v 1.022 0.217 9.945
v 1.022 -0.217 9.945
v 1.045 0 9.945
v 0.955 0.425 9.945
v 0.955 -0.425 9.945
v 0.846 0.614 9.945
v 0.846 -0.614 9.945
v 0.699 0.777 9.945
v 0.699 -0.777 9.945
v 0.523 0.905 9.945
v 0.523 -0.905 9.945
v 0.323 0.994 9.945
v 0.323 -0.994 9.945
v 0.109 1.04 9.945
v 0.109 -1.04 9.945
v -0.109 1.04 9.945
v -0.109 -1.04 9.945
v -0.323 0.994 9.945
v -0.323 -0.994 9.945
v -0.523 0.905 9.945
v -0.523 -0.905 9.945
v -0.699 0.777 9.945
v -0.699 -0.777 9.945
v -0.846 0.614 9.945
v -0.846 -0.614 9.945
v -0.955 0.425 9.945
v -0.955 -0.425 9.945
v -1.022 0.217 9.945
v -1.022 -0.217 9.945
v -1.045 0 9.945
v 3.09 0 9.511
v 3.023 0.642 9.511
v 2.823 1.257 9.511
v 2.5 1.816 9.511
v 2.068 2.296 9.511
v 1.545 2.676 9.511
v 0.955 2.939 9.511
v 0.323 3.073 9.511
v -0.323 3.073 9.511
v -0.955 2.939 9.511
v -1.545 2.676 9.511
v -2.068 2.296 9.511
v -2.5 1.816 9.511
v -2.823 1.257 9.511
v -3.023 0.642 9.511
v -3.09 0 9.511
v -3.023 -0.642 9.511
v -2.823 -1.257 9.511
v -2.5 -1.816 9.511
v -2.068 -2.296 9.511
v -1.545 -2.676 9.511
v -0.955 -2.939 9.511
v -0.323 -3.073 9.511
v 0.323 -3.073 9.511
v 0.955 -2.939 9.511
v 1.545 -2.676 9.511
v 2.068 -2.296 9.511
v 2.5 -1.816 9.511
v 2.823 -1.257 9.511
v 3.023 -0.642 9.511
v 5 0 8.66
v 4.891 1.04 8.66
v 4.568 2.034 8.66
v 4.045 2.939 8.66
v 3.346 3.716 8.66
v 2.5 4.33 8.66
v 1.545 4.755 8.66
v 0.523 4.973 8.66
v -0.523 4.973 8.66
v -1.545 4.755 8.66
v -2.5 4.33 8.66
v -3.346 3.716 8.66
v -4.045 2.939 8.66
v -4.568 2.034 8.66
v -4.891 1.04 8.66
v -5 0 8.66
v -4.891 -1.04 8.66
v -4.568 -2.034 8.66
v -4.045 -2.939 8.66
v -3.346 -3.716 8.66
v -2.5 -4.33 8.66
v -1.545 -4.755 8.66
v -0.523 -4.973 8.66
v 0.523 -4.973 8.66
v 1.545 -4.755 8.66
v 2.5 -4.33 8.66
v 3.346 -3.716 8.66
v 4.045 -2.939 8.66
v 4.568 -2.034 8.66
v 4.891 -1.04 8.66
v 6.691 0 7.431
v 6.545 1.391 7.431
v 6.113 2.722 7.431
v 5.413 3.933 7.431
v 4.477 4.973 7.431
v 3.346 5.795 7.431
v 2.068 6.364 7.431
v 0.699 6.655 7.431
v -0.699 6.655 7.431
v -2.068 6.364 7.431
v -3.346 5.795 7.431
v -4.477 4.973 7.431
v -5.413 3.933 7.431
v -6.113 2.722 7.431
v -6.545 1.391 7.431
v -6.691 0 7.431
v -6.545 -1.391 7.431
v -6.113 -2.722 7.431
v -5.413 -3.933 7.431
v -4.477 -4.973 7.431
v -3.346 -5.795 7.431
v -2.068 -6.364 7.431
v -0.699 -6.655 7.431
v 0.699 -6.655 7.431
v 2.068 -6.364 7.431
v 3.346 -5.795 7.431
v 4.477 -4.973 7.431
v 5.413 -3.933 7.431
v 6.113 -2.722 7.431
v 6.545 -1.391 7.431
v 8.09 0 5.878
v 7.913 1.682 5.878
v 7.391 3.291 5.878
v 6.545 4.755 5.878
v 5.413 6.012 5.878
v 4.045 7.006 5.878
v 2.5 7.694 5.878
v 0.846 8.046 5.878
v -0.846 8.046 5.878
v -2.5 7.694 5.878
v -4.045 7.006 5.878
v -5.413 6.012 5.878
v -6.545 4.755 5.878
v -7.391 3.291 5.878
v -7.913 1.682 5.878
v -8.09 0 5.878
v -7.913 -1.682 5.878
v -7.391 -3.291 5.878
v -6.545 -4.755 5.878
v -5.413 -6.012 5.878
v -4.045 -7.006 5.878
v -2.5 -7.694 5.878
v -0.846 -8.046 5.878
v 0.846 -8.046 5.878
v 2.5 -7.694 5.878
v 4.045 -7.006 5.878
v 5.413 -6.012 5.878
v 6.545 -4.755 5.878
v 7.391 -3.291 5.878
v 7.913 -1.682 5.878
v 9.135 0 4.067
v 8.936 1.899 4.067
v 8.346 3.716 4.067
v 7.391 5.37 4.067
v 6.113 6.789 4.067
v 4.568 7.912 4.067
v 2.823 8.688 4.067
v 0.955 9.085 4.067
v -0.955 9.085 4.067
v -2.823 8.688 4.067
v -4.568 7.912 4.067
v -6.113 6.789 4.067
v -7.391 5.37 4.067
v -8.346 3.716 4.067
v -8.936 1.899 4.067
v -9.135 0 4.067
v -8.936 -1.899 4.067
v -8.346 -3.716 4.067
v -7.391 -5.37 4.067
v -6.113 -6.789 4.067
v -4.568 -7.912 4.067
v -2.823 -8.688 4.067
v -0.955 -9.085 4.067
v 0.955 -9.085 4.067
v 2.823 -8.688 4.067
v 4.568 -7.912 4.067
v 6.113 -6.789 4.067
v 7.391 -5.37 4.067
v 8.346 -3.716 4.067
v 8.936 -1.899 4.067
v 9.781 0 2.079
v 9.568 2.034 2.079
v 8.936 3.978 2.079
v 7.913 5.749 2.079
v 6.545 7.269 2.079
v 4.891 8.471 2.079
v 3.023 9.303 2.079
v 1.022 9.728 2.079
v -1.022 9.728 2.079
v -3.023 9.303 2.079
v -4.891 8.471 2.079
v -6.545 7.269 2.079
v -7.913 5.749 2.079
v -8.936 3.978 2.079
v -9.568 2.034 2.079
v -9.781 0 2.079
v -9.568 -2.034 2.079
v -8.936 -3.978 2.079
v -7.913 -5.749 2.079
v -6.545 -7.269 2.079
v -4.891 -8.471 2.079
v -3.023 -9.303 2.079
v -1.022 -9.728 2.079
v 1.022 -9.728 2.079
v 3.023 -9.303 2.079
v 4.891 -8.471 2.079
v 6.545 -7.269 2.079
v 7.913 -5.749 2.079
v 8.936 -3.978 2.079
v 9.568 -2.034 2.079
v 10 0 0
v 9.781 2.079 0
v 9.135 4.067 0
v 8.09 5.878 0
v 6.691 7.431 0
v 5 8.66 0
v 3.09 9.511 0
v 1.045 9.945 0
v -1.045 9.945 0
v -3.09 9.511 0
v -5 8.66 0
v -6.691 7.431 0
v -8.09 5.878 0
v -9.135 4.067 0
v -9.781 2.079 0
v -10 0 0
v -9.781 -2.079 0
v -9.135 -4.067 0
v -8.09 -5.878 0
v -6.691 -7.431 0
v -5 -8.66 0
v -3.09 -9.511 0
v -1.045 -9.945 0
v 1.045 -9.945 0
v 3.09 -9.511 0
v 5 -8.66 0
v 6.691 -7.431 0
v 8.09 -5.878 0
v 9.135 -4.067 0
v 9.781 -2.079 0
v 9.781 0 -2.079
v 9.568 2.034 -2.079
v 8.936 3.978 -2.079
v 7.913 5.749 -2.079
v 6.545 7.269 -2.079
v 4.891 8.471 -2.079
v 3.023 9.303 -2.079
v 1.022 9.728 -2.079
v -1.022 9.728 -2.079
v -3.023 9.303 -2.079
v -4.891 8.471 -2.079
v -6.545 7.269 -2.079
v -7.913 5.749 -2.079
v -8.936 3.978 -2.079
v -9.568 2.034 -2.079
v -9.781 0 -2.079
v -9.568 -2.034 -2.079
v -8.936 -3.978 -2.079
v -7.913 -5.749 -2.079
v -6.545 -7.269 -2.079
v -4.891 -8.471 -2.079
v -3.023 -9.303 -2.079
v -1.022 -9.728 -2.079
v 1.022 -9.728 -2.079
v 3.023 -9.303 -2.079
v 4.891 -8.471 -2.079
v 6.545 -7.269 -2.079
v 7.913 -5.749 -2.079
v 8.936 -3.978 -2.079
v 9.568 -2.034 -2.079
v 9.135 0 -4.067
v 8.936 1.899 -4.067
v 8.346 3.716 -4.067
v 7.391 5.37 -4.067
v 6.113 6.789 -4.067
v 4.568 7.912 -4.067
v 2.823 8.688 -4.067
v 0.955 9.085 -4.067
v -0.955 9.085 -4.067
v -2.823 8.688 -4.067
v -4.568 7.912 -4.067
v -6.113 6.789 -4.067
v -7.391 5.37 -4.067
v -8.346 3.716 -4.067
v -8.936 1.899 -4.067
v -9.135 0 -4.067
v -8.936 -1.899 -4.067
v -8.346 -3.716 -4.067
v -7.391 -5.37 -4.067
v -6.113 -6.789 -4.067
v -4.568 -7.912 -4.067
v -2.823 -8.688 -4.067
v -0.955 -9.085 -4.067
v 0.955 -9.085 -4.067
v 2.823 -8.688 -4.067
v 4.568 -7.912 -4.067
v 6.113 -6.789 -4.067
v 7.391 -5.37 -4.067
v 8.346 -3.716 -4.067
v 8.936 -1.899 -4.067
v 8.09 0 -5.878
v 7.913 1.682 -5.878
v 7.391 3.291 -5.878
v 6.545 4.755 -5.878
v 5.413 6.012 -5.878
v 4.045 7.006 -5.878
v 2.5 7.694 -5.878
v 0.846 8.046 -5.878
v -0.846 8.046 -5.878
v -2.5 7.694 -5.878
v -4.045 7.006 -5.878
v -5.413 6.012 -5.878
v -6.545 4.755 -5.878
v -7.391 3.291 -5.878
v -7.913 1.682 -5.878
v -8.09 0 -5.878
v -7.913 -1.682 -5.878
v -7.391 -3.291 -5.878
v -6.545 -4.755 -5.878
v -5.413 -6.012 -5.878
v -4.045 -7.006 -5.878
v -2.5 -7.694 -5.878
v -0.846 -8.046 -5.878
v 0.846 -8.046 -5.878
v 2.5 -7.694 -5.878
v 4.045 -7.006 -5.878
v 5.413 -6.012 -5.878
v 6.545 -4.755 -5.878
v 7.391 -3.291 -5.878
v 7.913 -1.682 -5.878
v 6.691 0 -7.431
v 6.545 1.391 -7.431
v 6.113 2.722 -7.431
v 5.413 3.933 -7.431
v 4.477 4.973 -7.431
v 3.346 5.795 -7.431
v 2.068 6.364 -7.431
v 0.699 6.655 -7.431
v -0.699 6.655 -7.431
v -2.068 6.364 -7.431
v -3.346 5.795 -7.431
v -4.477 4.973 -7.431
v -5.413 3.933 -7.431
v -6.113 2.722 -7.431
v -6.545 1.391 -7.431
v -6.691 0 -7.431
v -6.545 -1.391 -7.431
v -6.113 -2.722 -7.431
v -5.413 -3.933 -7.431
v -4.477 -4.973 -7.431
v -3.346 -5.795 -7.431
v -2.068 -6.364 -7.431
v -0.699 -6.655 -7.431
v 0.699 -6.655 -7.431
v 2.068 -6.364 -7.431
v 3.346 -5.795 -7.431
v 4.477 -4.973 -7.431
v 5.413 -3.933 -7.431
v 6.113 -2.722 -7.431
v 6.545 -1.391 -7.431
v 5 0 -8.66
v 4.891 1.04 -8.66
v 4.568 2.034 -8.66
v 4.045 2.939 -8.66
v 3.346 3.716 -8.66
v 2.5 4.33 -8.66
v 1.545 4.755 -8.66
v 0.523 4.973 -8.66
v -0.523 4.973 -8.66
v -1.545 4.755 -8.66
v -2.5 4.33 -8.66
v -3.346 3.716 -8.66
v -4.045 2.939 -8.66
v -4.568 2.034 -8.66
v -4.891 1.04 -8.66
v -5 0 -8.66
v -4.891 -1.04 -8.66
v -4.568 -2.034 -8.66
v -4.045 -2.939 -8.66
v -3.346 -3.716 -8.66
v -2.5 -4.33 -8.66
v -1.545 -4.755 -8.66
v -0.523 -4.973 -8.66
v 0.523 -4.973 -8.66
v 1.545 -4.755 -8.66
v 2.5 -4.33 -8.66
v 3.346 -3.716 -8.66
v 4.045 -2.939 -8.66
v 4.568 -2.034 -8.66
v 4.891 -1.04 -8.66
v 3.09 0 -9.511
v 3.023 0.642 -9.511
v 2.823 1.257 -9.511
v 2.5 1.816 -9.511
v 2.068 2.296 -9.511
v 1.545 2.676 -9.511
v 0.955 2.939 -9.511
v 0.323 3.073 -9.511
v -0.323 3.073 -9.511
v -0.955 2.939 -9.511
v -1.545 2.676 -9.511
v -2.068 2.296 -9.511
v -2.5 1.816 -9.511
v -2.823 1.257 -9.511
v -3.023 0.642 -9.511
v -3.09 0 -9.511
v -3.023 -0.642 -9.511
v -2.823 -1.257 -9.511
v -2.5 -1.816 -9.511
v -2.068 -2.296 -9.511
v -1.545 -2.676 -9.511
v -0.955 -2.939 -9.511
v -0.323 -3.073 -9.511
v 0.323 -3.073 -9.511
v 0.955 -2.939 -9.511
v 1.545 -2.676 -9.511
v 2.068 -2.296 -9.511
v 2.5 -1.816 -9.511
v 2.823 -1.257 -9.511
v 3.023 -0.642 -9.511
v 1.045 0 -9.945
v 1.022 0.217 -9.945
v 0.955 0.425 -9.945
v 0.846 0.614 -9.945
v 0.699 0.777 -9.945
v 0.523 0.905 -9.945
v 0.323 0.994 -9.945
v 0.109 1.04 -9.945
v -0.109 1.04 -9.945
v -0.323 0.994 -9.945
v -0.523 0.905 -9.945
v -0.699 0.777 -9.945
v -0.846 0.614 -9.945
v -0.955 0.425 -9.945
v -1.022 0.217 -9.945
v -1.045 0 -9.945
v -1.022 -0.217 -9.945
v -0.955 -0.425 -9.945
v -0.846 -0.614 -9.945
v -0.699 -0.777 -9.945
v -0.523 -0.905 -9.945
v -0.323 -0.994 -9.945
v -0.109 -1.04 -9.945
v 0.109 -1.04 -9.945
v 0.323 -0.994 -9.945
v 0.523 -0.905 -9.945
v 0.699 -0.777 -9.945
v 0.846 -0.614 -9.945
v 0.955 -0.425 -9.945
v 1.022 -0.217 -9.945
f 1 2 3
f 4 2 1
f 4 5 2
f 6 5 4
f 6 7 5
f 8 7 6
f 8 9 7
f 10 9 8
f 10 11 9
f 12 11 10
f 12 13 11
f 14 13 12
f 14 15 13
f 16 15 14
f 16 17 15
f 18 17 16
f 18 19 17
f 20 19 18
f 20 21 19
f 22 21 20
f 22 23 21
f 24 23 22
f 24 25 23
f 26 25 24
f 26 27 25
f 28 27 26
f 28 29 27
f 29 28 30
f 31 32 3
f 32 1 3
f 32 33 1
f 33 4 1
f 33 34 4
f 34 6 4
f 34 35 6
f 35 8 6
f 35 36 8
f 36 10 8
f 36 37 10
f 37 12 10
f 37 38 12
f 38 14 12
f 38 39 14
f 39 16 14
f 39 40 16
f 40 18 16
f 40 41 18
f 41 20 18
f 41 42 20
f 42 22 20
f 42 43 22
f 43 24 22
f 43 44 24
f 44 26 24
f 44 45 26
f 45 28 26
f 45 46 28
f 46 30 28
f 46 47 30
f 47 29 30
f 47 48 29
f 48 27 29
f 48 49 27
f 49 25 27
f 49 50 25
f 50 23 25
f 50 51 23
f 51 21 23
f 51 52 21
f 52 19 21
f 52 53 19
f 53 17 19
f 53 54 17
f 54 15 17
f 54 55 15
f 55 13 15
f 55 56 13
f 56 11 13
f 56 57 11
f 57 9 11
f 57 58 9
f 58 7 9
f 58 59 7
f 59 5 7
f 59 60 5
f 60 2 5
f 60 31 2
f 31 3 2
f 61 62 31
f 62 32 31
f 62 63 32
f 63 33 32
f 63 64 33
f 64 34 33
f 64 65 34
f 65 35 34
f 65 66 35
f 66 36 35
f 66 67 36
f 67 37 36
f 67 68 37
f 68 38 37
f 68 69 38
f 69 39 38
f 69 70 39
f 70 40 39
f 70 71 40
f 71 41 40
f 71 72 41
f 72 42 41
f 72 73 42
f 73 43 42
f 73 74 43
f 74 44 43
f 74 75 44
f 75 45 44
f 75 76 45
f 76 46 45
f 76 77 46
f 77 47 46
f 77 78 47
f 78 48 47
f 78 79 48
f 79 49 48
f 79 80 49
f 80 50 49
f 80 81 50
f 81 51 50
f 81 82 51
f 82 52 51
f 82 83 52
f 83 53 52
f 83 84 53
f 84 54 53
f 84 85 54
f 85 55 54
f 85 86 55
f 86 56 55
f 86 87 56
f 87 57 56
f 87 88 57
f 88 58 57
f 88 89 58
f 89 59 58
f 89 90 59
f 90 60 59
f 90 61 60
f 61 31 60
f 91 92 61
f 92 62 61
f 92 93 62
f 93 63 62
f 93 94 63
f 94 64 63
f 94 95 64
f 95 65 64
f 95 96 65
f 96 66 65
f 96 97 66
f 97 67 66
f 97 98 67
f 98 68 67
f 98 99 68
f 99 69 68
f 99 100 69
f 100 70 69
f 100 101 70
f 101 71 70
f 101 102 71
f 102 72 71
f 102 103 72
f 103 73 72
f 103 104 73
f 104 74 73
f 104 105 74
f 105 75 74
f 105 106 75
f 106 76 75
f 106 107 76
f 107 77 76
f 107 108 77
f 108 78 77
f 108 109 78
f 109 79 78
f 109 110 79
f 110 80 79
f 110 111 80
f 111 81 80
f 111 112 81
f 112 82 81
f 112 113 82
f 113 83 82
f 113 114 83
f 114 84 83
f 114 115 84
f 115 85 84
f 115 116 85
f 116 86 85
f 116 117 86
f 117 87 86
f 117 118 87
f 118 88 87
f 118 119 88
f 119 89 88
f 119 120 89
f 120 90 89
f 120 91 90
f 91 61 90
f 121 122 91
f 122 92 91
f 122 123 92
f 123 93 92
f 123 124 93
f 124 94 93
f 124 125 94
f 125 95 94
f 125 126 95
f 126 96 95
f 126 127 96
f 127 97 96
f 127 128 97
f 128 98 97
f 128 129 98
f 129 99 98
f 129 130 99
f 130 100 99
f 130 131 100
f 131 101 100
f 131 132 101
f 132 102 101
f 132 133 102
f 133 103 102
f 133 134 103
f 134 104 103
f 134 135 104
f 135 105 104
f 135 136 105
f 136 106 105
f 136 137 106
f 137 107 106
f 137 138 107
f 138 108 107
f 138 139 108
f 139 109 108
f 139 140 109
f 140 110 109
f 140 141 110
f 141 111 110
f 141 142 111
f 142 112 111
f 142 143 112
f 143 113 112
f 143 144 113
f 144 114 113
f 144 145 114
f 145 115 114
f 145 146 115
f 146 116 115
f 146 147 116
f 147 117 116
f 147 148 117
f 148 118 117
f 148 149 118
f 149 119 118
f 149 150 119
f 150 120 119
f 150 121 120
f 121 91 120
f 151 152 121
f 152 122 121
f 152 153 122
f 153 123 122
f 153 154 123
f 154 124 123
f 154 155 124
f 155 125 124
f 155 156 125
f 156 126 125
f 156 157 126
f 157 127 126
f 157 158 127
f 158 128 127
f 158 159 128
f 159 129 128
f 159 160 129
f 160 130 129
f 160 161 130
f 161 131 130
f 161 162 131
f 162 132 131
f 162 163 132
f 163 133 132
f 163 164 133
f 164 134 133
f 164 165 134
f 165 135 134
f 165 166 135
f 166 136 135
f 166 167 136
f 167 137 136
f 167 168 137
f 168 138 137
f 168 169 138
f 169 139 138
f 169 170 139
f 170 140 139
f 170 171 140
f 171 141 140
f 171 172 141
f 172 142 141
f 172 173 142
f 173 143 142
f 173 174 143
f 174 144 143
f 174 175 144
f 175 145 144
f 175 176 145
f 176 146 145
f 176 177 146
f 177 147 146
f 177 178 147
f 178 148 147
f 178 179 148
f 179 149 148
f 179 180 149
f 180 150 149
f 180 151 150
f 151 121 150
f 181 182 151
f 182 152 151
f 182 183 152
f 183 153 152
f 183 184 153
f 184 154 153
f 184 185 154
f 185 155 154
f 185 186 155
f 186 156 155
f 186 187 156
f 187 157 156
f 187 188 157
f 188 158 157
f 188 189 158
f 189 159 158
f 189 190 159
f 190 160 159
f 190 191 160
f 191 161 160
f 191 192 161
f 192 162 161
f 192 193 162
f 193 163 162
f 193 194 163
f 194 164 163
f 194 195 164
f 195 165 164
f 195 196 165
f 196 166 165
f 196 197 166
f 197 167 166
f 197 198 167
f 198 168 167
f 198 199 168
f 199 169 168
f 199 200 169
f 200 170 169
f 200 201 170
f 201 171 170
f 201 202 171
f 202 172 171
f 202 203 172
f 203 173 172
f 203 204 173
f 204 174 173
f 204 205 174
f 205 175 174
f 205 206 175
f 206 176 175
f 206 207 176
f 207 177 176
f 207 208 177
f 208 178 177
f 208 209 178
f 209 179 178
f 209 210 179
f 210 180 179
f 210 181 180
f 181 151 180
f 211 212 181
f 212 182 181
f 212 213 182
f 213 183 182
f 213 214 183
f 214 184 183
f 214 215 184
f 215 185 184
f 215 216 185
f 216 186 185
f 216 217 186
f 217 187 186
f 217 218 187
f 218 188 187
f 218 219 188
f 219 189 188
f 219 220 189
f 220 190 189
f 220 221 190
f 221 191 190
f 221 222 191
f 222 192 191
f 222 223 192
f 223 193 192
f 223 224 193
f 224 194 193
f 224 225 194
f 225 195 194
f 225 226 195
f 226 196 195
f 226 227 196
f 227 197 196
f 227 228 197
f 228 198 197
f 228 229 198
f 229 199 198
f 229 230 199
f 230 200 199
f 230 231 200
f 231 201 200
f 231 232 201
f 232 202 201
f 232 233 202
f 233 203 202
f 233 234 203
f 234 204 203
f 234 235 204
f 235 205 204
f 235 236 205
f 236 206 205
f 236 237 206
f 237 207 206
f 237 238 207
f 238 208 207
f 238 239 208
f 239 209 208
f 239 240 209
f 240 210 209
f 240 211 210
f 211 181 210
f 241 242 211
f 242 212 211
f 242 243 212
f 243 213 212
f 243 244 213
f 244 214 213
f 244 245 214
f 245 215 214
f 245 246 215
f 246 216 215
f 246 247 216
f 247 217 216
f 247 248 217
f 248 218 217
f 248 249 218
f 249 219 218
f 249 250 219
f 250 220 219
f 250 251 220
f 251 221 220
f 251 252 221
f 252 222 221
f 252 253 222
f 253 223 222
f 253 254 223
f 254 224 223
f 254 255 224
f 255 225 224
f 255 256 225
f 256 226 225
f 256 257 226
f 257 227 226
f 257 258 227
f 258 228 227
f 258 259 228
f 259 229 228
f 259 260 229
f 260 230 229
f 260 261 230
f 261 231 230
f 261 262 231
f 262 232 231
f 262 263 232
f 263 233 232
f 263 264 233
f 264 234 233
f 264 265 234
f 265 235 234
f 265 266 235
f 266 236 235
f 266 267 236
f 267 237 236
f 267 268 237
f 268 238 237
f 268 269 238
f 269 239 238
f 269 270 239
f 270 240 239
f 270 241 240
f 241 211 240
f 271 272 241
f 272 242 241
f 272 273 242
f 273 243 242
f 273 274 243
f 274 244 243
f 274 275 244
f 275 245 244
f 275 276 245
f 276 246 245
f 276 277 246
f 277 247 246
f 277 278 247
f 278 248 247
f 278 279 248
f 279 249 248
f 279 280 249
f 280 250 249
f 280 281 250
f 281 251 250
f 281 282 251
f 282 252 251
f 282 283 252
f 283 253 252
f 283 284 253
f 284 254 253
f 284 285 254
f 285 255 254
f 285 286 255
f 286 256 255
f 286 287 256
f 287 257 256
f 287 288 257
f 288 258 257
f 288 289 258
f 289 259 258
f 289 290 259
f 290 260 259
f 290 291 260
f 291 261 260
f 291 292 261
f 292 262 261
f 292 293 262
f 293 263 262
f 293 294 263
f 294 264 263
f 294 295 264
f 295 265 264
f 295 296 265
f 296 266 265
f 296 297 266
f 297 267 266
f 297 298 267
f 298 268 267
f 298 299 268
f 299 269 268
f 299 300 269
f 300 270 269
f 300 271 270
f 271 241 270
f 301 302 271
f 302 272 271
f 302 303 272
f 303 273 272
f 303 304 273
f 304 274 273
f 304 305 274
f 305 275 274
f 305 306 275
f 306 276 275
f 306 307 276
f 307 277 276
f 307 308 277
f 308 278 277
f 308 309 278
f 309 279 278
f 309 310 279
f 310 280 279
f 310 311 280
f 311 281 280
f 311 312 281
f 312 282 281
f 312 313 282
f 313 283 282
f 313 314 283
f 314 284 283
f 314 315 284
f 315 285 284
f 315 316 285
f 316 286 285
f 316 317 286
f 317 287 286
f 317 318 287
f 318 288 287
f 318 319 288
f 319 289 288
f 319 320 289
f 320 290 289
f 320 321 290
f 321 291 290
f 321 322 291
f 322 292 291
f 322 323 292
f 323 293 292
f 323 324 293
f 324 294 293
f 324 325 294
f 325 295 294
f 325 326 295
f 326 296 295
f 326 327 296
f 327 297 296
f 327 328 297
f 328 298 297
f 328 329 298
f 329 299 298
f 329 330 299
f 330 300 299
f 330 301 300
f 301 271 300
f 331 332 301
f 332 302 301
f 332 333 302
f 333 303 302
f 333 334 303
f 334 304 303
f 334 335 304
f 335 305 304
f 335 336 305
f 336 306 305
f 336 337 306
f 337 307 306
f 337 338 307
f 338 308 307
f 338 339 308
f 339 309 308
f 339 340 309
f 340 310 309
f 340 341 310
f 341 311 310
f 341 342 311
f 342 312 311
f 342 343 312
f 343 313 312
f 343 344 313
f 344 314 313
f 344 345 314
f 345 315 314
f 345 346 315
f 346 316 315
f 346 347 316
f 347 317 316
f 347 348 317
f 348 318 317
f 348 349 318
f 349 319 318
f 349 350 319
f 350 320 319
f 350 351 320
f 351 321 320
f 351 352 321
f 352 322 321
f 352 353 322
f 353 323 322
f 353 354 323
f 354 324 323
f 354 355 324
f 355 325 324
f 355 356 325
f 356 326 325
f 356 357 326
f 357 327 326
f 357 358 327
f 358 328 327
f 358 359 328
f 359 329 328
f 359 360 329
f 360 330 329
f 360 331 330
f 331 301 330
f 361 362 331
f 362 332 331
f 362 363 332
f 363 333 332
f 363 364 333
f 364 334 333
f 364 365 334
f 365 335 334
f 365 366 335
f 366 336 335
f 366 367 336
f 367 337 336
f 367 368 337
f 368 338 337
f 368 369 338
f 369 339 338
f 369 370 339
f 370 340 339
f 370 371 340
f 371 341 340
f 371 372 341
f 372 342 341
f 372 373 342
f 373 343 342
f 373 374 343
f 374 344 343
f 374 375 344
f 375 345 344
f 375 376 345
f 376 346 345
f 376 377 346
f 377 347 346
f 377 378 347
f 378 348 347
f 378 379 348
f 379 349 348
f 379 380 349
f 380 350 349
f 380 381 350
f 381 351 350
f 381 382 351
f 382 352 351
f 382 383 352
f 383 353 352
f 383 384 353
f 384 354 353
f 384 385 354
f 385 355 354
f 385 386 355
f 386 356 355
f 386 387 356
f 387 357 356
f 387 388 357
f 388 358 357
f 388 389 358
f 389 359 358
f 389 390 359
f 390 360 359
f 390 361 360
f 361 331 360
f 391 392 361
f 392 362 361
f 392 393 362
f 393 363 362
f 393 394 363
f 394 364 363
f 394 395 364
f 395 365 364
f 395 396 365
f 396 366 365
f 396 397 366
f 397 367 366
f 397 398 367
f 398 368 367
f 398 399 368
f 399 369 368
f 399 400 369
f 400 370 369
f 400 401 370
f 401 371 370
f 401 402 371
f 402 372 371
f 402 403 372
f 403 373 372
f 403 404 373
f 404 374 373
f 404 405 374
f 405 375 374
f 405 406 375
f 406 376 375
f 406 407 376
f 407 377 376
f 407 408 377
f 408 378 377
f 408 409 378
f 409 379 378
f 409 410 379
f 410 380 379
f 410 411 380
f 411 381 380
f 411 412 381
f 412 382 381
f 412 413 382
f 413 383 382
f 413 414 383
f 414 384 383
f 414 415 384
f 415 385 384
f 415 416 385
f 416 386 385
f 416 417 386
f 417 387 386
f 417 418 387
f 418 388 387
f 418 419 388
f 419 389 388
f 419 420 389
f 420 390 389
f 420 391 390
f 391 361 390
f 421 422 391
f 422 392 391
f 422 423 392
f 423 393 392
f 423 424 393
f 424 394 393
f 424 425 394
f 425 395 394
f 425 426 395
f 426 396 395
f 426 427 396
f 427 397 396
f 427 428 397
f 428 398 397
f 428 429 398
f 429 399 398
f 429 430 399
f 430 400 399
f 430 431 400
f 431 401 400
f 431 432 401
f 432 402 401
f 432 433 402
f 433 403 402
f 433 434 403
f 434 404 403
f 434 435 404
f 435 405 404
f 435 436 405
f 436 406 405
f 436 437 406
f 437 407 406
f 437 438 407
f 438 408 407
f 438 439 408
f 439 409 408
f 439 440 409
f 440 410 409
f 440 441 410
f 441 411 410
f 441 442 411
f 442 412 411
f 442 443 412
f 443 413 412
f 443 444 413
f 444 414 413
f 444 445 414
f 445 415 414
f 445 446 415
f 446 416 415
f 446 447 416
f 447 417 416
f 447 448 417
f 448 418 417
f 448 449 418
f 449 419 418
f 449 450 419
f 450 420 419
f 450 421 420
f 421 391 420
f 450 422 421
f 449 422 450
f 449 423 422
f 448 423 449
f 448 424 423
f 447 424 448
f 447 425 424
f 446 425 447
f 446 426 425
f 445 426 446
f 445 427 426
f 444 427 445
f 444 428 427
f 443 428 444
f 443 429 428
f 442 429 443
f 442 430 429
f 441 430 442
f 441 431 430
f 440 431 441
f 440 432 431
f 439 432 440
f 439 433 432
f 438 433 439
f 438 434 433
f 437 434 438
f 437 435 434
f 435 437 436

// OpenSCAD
/*
    .scad test project
*/
radius_with_a_name = 10; // very important variable

sphere(r = radius_with_a_name);

adjustment = 0.7;
adjustment_factor = 1.05;

function adjust(x) = (x + adjustment) * adjustment_factor;

main_radius = adjust(10);
margin = adjust(5);
depth = adjust(25);
